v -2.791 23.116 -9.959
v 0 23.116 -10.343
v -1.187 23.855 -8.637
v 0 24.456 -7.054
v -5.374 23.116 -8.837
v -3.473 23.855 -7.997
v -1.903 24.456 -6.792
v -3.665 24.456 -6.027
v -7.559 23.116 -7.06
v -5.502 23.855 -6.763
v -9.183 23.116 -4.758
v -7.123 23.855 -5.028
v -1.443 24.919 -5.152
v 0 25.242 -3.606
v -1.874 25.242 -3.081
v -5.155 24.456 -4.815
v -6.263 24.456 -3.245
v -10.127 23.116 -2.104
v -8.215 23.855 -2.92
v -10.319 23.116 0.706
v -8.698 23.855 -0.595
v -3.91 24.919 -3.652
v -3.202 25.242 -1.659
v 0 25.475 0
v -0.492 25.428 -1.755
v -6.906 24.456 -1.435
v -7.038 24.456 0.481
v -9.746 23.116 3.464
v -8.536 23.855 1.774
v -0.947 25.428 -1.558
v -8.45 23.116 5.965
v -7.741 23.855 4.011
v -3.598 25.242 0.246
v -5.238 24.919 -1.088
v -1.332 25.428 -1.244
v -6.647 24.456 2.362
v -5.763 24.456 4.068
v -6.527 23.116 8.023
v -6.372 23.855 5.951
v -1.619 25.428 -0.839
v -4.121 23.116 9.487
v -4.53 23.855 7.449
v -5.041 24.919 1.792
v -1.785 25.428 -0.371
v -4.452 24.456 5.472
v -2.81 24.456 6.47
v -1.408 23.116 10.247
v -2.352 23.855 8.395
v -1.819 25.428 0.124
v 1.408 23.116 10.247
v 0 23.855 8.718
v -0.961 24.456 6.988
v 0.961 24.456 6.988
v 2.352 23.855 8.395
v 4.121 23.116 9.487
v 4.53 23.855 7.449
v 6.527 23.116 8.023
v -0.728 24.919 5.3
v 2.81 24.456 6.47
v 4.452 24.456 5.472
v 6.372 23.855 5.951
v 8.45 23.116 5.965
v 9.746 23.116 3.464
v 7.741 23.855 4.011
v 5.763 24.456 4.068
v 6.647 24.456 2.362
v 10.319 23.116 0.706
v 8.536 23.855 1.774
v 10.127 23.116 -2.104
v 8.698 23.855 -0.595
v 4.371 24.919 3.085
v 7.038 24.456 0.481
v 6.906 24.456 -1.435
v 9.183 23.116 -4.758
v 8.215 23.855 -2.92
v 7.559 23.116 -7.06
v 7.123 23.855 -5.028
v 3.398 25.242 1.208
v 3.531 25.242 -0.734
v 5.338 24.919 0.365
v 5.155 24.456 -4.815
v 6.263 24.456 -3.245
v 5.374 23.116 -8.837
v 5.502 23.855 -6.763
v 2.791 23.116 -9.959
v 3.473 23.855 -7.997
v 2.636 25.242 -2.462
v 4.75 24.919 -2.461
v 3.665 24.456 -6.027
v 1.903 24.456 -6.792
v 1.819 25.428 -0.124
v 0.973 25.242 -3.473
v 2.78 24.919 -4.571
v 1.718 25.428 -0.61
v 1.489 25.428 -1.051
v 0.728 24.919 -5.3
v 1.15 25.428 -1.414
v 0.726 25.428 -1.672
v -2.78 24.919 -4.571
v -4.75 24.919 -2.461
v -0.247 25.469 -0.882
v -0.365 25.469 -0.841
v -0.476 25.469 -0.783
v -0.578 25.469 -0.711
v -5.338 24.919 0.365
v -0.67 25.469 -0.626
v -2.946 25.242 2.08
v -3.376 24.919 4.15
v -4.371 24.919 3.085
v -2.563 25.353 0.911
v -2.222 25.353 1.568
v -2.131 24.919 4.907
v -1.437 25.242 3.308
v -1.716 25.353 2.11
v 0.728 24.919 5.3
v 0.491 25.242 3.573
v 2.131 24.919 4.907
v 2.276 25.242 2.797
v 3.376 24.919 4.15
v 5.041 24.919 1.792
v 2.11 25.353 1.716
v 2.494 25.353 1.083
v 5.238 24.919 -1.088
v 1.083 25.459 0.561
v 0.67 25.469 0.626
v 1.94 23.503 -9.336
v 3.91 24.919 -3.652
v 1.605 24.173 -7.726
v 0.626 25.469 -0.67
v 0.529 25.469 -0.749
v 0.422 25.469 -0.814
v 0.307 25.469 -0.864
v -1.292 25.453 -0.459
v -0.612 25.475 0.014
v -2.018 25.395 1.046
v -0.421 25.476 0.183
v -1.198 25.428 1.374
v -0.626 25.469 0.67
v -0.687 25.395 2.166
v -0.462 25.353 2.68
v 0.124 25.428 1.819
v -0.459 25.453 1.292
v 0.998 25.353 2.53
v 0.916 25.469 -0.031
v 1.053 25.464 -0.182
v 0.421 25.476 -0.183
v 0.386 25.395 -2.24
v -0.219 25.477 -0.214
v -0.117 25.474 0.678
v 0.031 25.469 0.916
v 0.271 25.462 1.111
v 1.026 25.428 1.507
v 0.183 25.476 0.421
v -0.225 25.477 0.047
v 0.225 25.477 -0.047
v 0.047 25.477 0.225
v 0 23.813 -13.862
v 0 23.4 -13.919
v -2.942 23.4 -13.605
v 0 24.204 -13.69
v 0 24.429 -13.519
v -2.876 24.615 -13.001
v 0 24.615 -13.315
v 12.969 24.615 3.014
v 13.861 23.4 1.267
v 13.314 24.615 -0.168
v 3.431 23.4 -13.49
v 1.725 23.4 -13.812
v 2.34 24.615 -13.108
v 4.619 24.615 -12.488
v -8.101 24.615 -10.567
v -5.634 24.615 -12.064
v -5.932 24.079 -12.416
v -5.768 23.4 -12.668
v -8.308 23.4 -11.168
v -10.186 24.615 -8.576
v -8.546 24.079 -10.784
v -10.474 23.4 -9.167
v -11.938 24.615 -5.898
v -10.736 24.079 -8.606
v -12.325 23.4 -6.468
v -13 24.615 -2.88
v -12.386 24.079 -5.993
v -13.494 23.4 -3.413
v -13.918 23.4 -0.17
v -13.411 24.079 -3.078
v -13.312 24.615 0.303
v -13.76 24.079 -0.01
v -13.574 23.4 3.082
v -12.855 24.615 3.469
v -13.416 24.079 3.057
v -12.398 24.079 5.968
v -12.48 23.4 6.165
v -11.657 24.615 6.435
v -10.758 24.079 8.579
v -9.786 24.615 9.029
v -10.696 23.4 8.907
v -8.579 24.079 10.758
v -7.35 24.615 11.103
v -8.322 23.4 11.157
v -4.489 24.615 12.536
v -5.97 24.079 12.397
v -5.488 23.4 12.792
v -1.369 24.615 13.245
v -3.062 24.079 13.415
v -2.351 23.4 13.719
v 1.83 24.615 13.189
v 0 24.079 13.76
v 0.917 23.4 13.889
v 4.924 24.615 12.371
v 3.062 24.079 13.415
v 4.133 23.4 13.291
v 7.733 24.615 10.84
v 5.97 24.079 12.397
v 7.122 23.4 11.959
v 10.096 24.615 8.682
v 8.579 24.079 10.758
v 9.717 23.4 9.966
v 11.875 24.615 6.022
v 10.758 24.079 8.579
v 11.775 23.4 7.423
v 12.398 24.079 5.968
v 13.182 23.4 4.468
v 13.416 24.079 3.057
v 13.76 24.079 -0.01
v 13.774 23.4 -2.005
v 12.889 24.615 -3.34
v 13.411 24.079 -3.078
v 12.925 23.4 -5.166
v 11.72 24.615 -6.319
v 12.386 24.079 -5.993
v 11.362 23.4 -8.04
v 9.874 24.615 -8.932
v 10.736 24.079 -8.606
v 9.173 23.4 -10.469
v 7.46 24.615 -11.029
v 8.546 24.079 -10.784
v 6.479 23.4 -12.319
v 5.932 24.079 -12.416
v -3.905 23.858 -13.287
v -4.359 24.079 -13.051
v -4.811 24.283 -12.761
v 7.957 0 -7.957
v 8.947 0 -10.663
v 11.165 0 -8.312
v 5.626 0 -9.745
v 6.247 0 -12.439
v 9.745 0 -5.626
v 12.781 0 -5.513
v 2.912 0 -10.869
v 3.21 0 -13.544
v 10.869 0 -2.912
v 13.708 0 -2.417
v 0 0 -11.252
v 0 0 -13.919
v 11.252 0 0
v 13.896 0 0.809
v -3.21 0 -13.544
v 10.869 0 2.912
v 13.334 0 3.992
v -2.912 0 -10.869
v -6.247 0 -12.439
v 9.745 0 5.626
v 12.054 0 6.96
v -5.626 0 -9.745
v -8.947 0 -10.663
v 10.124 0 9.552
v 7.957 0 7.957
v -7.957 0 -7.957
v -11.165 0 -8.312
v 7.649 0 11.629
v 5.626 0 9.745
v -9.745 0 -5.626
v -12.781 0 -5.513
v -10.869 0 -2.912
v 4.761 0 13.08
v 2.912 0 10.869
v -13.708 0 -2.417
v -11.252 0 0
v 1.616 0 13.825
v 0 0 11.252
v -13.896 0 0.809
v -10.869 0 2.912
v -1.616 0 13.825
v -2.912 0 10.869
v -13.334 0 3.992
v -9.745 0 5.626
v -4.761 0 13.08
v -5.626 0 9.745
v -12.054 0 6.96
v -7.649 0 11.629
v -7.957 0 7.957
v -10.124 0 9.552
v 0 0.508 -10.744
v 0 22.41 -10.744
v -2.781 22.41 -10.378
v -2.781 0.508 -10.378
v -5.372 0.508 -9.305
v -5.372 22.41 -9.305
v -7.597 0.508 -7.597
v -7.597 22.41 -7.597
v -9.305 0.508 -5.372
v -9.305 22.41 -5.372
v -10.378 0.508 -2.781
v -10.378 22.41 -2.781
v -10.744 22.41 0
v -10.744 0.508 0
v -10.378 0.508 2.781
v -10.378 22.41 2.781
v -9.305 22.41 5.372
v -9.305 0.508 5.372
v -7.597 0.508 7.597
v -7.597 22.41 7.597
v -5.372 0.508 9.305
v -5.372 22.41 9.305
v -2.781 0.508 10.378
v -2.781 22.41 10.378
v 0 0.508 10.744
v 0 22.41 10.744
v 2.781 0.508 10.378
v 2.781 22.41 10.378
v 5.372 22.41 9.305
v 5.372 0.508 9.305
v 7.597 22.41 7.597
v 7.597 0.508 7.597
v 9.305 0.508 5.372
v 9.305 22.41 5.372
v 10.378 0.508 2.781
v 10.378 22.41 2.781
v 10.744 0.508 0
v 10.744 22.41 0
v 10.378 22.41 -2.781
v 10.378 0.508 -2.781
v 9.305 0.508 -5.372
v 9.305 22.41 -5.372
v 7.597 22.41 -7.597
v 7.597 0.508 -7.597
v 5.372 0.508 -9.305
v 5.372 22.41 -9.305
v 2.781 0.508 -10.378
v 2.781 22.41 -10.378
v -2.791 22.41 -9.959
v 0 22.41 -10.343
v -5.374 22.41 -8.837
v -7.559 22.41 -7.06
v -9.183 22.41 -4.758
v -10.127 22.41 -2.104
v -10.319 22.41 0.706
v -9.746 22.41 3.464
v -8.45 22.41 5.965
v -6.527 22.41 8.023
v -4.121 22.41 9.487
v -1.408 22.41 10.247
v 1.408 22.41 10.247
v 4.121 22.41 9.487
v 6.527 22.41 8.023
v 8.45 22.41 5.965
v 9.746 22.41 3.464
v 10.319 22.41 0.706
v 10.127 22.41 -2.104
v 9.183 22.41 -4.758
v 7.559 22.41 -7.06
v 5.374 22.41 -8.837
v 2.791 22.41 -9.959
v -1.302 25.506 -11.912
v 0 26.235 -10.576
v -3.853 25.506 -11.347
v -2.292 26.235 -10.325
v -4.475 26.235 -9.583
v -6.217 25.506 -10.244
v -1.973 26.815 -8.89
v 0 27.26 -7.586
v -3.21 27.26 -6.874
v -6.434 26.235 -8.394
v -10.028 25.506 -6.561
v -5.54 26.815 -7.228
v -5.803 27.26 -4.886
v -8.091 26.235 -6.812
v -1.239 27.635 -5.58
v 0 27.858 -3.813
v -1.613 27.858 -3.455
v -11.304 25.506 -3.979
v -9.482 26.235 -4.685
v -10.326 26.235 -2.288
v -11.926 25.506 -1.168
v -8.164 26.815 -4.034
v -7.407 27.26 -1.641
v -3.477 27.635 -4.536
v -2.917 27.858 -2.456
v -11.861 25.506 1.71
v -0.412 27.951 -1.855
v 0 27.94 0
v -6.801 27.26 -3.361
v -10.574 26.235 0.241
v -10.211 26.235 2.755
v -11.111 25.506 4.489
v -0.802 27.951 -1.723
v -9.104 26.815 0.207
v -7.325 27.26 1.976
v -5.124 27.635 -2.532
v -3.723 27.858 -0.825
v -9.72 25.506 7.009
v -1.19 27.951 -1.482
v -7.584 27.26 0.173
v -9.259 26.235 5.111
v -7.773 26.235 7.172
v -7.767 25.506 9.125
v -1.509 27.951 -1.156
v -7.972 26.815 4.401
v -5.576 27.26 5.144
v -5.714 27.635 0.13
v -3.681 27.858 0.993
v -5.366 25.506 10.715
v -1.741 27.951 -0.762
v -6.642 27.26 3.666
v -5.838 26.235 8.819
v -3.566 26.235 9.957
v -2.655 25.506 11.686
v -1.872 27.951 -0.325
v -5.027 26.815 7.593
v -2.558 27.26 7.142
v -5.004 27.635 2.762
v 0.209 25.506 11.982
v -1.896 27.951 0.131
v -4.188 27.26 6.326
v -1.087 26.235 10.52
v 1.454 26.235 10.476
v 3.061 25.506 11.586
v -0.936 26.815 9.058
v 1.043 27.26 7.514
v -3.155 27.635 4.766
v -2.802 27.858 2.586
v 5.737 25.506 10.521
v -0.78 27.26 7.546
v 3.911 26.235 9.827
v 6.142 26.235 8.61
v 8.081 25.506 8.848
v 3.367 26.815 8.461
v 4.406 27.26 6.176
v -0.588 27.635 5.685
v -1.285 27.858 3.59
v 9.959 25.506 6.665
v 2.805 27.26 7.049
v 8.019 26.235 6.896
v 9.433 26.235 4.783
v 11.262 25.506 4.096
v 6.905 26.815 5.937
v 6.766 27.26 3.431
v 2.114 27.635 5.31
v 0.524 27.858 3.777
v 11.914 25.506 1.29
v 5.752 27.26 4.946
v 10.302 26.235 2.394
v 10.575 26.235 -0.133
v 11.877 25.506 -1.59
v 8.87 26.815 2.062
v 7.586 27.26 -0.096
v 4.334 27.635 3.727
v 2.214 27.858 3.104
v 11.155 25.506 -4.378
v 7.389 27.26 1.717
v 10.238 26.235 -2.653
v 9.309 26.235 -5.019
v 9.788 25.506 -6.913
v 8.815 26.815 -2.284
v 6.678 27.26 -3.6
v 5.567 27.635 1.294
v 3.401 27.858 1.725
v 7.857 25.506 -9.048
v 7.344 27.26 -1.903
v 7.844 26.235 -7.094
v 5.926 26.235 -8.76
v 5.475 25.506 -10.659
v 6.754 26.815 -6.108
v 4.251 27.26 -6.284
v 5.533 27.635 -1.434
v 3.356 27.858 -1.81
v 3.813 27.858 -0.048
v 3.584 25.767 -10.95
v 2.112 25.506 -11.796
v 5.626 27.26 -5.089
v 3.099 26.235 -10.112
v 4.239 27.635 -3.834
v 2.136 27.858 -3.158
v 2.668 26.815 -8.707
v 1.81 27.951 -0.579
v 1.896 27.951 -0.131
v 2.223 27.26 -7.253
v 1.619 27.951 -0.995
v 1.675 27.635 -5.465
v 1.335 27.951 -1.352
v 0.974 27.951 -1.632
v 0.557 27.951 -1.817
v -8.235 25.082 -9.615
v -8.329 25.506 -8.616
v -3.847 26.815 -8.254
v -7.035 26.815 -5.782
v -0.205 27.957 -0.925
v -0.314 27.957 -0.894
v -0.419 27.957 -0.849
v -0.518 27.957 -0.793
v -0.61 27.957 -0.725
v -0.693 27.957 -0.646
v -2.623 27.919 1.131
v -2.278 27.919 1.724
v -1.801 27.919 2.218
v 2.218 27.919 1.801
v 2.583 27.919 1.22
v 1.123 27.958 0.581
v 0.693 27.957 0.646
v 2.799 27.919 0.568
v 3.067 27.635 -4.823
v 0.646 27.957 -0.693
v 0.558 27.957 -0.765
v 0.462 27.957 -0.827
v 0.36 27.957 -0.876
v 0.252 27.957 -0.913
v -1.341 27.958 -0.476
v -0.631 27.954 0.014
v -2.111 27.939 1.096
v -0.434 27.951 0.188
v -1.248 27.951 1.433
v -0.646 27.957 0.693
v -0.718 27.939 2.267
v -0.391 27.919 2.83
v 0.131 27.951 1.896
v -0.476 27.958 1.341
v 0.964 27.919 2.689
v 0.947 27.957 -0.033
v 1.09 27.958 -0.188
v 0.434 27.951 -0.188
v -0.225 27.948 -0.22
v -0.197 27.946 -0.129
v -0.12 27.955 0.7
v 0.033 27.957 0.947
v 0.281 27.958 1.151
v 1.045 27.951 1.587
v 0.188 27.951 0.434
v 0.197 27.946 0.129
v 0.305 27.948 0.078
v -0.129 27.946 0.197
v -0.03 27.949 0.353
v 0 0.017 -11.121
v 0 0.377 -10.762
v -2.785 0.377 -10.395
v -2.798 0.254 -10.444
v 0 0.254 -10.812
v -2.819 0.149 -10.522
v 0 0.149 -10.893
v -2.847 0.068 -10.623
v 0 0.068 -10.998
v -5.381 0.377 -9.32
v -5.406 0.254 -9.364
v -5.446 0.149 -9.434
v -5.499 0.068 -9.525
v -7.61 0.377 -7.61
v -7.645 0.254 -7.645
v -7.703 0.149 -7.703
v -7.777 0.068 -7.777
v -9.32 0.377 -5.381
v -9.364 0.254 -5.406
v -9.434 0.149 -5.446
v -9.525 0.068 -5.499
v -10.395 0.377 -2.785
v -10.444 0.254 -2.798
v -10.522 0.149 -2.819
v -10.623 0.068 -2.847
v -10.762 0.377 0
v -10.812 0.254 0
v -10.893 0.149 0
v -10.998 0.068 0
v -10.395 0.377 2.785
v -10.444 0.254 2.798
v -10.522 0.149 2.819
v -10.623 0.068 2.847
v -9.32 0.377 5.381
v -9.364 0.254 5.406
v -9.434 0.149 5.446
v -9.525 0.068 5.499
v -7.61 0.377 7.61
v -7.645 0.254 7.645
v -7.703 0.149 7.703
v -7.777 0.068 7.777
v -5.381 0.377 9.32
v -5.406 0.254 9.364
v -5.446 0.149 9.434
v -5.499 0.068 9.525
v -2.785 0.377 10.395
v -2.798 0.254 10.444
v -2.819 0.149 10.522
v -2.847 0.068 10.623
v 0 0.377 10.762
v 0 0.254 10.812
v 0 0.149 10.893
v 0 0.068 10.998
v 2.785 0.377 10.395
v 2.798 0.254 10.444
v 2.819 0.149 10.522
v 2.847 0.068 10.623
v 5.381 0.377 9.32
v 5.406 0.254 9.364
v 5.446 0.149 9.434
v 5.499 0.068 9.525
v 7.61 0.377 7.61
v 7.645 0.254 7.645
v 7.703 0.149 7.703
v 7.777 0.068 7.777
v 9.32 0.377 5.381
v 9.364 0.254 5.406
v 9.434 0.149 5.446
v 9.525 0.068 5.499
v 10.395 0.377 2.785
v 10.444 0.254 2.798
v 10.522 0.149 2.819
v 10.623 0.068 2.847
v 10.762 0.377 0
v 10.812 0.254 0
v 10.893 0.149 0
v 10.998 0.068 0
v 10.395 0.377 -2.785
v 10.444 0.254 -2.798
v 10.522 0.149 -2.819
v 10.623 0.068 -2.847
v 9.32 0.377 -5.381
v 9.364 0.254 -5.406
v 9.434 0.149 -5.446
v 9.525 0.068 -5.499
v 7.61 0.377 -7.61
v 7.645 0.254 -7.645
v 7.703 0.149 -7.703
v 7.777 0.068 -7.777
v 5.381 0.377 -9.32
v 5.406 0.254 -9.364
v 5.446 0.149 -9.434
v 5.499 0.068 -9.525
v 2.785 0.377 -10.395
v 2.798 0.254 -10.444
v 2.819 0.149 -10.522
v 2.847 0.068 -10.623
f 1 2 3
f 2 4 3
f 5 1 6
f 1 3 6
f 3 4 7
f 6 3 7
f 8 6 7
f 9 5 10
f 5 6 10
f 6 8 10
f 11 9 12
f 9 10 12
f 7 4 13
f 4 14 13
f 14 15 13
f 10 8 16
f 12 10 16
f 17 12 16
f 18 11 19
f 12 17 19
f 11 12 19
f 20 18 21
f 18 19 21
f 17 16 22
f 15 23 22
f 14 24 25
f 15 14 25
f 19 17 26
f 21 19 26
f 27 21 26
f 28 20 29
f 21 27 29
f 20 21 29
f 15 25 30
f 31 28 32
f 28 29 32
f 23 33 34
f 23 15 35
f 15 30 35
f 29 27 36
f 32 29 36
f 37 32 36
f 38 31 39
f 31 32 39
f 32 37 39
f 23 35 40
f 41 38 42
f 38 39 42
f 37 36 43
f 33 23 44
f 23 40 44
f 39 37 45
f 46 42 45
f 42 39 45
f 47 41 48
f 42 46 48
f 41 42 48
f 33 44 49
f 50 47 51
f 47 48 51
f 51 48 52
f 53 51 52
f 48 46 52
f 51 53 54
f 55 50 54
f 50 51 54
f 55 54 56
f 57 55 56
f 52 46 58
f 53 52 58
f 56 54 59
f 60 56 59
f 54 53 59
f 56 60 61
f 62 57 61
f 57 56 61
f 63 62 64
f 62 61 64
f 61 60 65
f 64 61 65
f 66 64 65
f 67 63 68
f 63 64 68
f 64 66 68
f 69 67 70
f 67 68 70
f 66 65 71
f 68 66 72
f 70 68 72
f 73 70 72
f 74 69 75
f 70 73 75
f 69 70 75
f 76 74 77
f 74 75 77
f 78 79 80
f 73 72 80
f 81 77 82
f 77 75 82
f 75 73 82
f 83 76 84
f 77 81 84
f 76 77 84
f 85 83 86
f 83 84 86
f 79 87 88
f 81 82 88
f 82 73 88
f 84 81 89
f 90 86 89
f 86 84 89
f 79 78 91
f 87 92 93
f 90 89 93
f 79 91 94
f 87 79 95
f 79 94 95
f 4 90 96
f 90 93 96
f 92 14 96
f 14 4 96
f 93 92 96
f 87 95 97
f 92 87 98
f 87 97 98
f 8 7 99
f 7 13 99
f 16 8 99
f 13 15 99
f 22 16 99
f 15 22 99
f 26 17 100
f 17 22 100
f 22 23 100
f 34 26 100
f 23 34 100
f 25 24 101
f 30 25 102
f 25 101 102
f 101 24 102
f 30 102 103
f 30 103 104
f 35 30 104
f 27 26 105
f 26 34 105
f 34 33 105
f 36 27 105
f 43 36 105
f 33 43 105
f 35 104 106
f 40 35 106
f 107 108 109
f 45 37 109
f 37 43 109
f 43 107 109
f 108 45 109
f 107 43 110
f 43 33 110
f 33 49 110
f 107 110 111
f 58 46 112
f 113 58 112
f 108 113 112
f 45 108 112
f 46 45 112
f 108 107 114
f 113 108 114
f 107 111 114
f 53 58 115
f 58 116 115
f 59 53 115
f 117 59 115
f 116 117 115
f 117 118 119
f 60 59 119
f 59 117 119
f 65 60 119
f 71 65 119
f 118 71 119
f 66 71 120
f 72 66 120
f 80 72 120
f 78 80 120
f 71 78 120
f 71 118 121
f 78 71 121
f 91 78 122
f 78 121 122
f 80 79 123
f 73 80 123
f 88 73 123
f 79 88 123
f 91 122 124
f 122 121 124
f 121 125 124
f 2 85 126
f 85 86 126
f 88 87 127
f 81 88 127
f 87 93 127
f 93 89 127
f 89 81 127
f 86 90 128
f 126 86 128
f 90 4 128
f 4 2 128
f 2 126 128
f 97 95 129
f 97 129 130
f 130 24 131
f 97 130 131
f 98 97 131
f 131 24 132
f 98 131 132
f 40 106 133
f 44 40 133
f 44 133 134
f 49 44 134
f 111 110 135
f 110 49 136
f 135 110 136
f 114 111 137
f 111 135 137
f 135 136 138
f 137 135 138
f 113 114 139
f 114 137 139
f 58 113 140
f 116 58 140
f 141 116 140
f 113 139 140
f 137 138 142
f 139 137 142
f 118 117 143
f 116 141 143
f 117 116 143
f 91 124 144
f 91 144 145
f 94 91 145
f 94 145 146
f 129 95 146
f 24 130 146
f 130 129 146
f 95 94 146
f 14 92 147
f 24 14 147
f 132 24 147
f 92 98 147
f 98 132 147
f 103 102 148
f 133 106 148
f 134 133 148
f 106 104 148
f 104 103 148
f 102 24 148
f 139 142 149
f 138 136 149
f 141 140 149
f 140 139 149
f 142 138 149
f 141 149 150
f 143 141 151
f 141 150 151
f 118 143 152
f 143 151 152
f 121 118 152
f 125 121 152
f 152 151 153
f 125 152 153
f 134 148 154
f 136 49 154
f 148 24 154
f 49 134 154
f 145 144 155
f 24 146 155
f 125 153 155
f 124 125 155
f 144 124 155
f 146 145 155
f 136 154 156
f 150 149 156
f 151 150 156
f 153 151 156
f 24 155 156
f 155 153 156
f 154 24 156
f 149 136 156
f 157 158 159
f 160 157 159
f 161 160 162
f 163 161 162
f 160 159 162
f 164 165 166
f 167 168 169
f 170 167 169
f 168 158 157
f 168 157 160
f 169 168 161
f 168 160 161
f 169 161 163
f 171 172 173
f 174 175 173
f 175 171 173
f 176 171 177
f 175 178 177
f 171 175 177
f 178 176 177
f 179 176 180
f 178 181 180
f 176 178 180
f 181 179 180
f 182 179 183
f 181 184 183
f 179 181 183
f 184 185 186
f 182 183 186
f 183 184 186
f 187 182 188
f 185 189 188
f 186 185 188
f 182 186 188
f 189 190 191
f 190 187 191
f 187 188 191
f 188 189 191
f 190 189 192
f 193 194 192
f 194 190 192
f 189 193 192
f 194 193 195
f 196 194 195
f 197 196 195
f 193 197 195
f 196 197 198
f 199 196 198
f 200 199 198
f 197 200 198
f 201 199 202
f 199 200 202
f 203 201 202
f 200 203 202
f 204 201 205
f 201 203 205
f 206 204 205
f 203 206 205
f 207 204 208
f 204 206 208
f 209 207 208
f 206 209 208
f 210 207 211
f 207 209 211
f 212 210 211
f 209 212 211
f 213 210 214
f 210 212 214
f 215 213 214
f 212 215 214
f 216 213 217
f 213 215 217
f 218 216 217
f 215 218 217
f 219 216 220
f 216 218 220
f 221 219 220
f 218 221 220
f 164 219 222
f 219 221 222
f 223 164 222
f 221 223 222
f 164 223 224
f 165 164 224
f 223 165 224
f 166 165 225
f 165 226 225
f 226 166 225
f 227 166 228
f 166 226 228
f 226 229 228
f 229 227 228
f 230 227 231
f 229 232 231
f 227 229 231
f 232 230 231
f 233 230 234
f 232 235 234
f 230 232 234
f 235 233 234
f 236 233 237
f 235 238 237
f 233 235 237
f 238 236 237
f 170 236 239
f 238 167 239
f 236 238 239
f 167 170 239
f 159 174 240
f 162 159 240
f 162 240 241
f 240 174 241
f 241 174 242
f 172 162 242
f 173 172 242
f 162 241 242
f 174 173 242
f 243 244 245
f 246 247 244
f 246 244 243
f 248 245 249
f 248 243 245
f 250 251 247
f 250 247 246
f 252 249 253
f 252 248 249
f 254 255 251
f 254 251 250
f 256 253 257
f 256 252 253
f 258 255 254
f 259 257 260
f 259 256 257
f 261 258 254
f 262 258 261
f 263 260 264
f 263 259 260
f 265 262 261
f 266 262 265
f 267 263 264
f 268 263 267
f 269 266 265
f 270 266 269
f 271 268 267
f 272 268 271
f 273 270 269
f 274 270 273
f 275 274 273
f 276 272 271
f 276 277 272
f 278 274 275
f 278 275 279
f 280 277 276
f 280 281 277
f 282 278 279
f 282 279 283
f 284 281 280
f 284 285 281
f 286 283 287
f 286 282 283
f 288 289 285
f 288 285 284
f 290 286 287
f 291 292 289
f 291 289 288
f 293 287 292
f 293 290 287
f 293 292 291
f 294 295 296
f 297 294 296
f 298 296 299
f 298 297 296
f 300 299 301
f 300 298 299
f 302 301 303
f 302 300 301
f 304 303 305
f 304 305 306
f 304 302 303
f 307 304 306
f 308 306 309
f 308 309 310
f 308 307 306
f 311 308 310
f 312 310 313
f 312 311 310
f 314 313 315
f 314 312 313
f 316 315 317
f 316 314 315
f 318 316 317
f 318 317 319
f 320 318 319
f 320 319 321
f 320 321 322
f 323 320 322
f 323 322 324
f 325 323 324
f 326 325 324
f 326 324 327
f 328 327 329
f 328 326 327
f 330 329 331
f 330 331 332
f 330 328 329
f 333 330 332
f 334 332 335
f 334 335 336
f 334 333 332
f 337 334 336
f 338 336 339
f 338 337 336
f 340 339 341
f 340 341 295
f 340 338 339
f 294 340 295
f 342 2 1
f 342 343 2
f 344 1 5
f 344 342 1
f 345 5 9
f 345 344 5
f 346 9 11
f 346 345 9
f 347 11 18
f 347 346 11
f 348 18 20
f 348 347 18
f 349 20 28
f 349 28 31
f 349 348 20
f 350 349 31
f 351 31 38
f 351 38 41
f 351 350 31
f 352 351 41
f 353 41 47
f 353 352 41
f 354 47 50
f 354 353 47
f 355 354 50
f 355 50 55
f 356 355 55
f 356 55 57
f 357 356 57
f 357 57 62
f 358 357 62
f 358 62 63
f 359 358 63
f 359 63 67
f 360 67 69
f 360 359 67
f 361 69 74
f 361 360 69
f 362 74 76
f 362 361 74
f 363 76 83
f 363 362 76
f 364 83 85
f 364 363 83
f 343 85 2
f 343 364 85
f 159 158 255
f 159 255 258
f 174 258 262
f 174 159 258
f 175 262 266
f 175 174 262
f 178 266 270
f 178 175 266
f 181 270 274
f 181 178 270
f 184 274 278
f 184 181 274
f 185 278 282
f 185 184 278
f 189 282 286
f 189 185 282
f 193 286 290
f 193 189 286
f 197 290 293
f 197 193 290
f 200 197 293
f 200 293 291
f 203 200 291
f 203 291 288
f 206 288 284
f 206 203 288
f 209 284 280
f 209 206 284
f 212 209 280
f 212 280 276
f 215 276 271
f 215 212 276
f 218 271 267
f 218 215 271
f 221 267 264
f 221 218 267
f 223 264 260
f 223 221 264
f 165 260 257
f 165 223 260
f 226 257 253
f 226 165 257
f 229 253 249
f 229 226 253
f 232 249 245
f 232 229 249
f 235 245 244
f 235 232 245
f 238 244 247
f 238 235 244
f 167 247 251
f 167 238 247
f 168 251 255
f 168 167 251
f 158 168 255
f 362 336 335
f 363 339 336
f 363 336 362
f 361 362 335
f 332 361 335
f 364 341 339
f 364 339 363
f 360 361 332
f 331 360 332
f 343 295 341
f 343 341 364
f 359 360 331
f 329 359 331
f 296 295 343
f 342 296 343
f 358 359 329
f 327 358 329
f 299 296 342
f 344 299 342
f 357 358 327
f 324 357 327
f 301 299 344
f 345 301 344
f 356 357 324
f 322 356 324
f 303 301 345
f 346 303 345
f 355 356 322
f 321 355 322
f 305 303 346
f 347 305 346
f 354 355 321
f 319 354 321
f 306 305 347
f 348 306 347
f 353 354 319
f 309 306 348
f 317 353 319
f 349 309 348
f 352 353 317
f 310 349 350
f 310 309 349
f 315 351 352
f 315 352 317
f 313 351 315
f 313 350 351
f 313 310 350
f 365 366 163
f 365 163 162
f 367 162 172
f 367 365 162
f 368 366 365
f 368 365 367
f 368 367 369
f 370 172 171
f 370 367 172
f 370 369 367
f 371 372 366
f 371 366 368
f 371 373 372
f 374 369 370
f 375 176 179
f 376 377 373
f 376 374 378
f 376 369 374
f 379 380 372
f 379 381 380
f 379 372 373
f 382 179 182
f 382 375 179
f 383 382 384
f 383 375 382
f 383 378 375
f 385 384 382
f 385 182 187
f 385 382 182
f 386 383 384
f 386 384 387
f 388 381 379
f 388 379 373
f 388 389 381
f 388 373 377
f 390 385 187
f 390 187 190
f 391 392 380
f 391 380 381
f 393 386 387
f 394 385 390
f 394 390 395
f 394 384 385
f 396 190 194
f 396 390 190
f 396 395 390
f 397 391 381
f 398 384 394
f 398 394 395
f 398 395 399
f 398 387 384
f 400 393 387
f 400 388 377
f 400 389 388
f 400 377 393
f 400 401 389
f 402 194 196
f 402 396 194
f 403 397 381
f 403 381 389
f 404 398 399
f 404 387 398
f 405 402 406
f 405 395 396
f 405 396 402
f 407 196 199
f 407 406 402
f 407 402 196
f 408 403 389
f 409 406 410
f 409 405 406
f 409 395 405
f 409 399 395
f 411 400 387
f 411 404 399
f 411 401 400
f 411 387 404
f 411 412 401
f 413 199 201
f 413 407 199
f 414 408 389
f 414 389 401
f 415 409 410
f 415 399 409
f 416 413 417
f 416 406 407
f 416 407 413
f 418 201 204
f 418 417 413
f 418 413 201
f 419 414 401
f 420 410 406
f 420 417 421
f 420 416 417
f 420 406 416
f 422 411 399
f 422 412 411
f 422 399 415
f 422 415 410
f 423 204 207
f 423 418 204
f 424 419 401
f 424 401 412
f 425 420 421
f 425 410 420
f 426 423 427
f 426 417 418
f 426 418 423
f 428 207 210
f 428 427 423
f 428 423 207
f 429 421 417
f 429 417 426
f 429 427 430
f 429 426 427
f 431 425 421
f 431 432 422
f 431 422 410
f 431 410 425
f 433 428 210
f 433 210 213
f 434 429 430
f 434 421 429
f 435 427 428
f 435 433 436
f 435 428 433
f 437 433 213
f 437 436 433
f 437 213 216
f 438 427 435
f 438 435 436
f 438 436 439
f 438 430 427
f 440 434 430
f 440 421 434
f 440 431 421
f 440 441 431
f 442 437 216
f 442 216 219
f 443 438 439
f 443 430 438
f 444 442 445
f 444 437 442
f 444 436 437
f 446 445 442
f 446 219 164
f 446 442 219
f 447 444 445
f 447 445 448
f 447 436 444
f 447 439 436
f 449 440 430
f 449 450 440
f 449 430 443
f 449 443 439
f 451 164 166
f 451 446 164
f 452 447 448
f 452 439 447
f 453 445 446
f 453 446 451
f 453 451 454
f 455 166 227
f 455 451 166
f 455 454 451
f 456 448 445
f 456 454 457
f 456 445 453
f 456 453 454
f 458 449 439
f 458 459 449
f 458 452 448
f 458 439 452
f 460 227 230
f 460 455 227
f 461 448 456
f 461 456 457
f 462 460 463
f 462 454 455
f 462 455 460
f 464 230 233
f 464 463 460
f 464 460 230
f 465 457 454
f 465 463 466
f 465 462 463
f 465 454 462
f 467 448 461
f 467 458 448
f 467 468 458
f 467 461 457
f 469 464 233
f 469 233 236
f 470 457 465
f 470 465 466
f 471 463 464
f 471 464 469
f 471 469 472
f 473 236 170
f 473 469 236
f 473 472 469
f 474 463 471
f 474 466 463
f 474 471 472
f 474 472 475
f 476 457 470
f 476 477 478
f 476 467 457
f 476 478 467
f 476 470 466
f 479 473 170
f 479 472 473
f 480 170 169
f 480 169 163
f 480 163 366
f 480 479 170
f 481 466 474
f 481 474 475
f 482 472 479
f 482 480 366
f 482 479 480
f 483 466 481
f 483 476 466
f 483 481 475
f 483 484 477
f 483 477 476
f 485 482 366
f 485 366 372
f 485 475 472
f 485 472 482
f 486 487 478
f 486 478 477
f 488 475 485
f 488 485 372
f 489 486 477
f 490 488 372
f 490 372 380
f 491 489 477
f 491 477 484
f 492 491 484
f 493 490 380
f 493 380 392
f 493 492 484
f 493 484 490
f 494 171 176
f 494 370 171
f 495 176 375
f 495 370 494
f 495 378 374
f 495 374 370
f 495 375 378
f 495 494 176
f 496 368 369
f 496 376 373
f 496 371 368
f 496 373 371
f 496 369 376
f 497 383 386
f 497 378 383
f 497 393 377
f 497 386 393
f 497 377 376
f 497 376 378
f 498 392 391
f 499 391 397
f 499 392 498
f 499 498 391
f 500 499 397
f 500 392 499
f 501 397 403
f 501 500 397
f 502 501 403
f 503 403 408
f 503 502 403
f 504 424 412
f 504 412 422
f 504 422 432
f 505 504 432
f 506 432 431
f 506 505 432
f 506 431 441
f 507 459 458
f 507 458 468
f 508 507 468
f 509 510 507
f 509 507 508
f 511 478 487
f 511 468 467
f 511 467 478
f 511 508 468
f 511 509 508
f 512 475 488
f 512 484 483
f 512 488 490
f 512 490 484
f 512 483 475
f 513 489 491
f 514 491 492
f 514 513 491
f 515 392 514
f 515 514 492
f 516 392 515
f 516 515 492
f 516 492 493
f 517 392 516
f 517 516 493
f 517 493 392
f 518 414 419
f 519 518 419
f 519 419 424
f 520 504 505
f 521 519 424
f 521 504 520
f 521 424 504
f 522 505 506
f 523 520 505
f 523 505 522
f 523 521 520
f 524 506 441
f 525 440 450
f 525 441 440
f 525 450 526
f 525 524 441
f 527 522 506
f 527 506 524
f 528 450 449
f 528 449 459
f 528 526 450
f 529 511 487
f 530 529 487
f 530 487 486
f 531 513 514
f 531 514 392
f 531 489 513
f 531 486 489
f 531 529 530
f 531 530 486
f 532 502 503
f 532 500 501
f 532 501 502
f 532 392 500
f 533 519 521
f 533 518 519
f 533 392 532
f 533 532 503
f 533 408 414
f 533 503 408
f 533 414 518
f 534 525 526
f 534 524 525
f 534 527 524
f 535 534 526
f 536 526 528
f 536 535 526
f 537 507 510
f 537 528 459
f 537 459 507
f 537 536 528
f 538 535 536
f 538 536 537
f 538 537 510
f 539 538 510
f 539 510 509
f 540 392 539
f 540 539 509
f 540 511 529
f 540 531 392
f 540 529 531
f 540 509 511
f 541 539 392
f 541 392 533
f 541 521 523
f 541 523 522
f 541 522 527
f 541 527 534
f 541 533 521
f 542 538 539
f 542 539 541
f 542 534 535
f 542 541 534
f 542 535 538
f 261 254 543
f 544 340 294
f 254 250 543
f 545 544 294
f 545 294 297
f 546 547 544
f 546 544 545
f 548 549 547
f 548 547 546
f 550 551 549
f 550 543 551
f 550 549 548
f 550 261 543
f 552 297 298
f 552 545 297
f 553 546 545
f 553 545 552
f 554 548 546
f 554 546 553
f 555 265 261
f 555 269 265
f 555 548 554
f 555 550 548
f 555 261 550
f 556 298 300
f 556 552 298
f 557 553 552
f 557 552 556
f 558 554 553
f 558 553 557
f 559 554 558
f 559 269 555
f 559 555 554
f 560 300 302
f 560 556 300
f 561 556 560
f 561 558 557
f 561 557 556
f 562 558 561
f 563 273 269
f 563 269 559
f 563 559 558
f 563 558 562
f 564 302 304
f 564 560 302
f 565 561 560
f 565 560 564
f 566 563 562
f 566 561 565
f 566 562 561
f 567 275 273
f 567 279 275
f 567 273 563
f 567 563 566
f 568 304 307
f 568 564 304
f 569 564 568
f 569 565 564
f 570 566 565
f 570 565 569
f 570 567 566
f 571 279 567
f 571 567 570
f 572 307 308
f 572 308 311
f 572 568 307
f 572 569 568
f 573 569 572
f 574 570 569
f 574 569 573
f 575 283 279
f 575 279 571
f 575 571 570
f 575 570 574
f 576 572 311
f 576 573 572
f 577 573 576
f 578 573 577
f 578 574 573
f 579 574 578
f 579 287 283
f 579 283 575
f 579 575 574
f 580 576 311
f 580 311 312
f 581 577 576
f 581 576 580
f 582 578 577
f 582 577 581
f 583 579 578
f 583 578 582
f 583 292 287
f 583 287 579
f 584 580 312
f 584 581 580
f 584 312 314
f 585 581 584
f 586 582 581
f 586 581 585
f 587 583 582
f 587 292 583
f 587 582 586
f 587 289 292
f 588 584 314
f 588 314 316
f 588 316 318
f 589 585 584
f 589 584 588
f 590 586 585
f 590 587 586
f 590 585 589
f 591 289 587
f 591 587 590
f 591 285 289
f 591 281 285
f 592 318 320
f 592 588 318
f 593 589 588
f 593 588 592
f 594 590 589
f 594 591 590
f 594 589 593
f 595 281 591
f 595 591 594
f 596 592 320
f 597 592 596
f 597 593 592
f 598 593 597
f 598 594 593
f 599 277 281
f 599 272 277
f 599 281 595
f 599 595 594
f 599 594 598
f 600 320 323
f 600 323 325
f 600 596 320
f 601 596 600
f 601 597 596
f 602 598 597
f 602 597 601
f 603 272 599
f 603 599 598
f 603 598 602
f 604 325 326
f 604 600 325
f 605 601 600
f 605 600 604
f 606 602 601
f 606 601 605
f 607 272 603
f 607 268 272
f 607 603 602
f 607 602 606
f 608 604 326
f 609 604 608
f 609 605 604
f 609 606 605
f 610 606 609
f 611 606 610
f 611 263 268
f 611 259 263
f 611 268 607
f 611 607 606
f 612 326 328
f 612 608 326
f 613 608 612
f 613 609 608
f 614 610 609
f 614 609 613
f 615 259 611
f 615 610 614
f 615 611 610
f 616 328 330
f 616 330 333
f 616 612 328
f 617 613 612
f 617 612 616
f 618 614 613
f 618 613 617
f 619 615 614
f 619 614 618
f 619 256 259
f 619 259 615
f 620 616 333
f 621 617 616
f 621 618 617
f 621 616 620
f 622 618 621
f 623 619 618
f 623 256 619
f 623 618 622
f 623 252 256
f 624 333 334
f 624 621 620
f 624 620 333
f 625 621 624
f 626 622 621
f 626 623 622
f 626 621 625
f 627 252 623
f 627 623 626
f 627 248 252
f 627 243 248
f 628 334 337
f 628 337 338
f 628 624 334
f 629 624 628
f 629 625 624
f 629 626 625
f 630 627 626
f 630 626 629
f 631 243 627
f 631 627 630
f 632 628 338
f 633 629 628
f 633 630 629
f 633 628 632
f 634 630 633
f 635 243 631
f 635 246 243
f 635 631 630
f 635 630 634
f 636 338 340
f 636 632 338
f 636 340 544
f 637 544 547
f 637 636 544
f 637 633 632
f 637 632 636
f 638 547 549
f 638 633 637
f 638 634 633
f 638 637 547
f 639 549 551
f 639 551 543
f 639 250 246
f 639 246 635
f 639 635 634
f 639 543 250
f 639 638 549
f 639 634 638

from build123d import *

# Parameters (mm, degrees)
FILLET1_R = 0.508
FILLET2_R = 1.524


with BuildPart() as part:
    # Sketch1 → Revolve1 (revolve)
    with BuildSketch(Plane(origin=(0, 0, 0), x_dir=(0, 0, -1), z_dir=(1, 0, 0)), mode=Mode.PRIVATE) as revolve1_sk:
        with BuildLine():
            Line((-10.7442, 22.410197806), (-10.7442, 0))
            Line((-10.7442, 0), (-13.9192, 0))
            Line((-13.9192, 0), (-13.9192, 24.13))
            add(Edge.make_bspline(
                [(-13.9192, 24.13), (-10.066559664, 27.411628122), (-4.86398701, 28.085571939), (0, 27.94)],
                knots=[0, 0, 0, 0, 1, 1, 1, 1], degree=3))
            Line((0, 27.94), (0, 25.475077416))
            add(Edge.make_bspline(
                [(-10.343014188, 23.11581757), (-7.133322616, 24.732985356), (-3.68565122, 25.519405304), (0, 25.475077416)],
                knots=[0.040116886, 0.040116886, 0.040116886, 0.040116886, 1, 1, 1, 1], degree=3))
            Line((-10.343014188, 23.11581757), (-10.343014188, 22.410197806))
            Line((-10.343014188, 22.410197806), (-10.7442, 22.410197806))
        make_face()
    revolve(revolve1_sk.sketch.rotate(Axis((0, 0, 0), (0, 1, 0)), 180), axis=Axis((0, 0, 0), (0, 1, 0)))

    # Fillet1
    fillet1_edges = [part.edges().sort_by_distance(p)[0] for p in [
        (0, 0, 10.7442),
    ]]
    fillet(fillet1_edges, radius=FILLET1_R)

    # Fillet2
    fillet2_edges = [part.edges().sort_by_distance(p)[0] for p in [
        (0, 24.13, 13.9192),
    ]]
    fillet(fillet2_edges, radius=FILLET2_R)


solid = part.part
